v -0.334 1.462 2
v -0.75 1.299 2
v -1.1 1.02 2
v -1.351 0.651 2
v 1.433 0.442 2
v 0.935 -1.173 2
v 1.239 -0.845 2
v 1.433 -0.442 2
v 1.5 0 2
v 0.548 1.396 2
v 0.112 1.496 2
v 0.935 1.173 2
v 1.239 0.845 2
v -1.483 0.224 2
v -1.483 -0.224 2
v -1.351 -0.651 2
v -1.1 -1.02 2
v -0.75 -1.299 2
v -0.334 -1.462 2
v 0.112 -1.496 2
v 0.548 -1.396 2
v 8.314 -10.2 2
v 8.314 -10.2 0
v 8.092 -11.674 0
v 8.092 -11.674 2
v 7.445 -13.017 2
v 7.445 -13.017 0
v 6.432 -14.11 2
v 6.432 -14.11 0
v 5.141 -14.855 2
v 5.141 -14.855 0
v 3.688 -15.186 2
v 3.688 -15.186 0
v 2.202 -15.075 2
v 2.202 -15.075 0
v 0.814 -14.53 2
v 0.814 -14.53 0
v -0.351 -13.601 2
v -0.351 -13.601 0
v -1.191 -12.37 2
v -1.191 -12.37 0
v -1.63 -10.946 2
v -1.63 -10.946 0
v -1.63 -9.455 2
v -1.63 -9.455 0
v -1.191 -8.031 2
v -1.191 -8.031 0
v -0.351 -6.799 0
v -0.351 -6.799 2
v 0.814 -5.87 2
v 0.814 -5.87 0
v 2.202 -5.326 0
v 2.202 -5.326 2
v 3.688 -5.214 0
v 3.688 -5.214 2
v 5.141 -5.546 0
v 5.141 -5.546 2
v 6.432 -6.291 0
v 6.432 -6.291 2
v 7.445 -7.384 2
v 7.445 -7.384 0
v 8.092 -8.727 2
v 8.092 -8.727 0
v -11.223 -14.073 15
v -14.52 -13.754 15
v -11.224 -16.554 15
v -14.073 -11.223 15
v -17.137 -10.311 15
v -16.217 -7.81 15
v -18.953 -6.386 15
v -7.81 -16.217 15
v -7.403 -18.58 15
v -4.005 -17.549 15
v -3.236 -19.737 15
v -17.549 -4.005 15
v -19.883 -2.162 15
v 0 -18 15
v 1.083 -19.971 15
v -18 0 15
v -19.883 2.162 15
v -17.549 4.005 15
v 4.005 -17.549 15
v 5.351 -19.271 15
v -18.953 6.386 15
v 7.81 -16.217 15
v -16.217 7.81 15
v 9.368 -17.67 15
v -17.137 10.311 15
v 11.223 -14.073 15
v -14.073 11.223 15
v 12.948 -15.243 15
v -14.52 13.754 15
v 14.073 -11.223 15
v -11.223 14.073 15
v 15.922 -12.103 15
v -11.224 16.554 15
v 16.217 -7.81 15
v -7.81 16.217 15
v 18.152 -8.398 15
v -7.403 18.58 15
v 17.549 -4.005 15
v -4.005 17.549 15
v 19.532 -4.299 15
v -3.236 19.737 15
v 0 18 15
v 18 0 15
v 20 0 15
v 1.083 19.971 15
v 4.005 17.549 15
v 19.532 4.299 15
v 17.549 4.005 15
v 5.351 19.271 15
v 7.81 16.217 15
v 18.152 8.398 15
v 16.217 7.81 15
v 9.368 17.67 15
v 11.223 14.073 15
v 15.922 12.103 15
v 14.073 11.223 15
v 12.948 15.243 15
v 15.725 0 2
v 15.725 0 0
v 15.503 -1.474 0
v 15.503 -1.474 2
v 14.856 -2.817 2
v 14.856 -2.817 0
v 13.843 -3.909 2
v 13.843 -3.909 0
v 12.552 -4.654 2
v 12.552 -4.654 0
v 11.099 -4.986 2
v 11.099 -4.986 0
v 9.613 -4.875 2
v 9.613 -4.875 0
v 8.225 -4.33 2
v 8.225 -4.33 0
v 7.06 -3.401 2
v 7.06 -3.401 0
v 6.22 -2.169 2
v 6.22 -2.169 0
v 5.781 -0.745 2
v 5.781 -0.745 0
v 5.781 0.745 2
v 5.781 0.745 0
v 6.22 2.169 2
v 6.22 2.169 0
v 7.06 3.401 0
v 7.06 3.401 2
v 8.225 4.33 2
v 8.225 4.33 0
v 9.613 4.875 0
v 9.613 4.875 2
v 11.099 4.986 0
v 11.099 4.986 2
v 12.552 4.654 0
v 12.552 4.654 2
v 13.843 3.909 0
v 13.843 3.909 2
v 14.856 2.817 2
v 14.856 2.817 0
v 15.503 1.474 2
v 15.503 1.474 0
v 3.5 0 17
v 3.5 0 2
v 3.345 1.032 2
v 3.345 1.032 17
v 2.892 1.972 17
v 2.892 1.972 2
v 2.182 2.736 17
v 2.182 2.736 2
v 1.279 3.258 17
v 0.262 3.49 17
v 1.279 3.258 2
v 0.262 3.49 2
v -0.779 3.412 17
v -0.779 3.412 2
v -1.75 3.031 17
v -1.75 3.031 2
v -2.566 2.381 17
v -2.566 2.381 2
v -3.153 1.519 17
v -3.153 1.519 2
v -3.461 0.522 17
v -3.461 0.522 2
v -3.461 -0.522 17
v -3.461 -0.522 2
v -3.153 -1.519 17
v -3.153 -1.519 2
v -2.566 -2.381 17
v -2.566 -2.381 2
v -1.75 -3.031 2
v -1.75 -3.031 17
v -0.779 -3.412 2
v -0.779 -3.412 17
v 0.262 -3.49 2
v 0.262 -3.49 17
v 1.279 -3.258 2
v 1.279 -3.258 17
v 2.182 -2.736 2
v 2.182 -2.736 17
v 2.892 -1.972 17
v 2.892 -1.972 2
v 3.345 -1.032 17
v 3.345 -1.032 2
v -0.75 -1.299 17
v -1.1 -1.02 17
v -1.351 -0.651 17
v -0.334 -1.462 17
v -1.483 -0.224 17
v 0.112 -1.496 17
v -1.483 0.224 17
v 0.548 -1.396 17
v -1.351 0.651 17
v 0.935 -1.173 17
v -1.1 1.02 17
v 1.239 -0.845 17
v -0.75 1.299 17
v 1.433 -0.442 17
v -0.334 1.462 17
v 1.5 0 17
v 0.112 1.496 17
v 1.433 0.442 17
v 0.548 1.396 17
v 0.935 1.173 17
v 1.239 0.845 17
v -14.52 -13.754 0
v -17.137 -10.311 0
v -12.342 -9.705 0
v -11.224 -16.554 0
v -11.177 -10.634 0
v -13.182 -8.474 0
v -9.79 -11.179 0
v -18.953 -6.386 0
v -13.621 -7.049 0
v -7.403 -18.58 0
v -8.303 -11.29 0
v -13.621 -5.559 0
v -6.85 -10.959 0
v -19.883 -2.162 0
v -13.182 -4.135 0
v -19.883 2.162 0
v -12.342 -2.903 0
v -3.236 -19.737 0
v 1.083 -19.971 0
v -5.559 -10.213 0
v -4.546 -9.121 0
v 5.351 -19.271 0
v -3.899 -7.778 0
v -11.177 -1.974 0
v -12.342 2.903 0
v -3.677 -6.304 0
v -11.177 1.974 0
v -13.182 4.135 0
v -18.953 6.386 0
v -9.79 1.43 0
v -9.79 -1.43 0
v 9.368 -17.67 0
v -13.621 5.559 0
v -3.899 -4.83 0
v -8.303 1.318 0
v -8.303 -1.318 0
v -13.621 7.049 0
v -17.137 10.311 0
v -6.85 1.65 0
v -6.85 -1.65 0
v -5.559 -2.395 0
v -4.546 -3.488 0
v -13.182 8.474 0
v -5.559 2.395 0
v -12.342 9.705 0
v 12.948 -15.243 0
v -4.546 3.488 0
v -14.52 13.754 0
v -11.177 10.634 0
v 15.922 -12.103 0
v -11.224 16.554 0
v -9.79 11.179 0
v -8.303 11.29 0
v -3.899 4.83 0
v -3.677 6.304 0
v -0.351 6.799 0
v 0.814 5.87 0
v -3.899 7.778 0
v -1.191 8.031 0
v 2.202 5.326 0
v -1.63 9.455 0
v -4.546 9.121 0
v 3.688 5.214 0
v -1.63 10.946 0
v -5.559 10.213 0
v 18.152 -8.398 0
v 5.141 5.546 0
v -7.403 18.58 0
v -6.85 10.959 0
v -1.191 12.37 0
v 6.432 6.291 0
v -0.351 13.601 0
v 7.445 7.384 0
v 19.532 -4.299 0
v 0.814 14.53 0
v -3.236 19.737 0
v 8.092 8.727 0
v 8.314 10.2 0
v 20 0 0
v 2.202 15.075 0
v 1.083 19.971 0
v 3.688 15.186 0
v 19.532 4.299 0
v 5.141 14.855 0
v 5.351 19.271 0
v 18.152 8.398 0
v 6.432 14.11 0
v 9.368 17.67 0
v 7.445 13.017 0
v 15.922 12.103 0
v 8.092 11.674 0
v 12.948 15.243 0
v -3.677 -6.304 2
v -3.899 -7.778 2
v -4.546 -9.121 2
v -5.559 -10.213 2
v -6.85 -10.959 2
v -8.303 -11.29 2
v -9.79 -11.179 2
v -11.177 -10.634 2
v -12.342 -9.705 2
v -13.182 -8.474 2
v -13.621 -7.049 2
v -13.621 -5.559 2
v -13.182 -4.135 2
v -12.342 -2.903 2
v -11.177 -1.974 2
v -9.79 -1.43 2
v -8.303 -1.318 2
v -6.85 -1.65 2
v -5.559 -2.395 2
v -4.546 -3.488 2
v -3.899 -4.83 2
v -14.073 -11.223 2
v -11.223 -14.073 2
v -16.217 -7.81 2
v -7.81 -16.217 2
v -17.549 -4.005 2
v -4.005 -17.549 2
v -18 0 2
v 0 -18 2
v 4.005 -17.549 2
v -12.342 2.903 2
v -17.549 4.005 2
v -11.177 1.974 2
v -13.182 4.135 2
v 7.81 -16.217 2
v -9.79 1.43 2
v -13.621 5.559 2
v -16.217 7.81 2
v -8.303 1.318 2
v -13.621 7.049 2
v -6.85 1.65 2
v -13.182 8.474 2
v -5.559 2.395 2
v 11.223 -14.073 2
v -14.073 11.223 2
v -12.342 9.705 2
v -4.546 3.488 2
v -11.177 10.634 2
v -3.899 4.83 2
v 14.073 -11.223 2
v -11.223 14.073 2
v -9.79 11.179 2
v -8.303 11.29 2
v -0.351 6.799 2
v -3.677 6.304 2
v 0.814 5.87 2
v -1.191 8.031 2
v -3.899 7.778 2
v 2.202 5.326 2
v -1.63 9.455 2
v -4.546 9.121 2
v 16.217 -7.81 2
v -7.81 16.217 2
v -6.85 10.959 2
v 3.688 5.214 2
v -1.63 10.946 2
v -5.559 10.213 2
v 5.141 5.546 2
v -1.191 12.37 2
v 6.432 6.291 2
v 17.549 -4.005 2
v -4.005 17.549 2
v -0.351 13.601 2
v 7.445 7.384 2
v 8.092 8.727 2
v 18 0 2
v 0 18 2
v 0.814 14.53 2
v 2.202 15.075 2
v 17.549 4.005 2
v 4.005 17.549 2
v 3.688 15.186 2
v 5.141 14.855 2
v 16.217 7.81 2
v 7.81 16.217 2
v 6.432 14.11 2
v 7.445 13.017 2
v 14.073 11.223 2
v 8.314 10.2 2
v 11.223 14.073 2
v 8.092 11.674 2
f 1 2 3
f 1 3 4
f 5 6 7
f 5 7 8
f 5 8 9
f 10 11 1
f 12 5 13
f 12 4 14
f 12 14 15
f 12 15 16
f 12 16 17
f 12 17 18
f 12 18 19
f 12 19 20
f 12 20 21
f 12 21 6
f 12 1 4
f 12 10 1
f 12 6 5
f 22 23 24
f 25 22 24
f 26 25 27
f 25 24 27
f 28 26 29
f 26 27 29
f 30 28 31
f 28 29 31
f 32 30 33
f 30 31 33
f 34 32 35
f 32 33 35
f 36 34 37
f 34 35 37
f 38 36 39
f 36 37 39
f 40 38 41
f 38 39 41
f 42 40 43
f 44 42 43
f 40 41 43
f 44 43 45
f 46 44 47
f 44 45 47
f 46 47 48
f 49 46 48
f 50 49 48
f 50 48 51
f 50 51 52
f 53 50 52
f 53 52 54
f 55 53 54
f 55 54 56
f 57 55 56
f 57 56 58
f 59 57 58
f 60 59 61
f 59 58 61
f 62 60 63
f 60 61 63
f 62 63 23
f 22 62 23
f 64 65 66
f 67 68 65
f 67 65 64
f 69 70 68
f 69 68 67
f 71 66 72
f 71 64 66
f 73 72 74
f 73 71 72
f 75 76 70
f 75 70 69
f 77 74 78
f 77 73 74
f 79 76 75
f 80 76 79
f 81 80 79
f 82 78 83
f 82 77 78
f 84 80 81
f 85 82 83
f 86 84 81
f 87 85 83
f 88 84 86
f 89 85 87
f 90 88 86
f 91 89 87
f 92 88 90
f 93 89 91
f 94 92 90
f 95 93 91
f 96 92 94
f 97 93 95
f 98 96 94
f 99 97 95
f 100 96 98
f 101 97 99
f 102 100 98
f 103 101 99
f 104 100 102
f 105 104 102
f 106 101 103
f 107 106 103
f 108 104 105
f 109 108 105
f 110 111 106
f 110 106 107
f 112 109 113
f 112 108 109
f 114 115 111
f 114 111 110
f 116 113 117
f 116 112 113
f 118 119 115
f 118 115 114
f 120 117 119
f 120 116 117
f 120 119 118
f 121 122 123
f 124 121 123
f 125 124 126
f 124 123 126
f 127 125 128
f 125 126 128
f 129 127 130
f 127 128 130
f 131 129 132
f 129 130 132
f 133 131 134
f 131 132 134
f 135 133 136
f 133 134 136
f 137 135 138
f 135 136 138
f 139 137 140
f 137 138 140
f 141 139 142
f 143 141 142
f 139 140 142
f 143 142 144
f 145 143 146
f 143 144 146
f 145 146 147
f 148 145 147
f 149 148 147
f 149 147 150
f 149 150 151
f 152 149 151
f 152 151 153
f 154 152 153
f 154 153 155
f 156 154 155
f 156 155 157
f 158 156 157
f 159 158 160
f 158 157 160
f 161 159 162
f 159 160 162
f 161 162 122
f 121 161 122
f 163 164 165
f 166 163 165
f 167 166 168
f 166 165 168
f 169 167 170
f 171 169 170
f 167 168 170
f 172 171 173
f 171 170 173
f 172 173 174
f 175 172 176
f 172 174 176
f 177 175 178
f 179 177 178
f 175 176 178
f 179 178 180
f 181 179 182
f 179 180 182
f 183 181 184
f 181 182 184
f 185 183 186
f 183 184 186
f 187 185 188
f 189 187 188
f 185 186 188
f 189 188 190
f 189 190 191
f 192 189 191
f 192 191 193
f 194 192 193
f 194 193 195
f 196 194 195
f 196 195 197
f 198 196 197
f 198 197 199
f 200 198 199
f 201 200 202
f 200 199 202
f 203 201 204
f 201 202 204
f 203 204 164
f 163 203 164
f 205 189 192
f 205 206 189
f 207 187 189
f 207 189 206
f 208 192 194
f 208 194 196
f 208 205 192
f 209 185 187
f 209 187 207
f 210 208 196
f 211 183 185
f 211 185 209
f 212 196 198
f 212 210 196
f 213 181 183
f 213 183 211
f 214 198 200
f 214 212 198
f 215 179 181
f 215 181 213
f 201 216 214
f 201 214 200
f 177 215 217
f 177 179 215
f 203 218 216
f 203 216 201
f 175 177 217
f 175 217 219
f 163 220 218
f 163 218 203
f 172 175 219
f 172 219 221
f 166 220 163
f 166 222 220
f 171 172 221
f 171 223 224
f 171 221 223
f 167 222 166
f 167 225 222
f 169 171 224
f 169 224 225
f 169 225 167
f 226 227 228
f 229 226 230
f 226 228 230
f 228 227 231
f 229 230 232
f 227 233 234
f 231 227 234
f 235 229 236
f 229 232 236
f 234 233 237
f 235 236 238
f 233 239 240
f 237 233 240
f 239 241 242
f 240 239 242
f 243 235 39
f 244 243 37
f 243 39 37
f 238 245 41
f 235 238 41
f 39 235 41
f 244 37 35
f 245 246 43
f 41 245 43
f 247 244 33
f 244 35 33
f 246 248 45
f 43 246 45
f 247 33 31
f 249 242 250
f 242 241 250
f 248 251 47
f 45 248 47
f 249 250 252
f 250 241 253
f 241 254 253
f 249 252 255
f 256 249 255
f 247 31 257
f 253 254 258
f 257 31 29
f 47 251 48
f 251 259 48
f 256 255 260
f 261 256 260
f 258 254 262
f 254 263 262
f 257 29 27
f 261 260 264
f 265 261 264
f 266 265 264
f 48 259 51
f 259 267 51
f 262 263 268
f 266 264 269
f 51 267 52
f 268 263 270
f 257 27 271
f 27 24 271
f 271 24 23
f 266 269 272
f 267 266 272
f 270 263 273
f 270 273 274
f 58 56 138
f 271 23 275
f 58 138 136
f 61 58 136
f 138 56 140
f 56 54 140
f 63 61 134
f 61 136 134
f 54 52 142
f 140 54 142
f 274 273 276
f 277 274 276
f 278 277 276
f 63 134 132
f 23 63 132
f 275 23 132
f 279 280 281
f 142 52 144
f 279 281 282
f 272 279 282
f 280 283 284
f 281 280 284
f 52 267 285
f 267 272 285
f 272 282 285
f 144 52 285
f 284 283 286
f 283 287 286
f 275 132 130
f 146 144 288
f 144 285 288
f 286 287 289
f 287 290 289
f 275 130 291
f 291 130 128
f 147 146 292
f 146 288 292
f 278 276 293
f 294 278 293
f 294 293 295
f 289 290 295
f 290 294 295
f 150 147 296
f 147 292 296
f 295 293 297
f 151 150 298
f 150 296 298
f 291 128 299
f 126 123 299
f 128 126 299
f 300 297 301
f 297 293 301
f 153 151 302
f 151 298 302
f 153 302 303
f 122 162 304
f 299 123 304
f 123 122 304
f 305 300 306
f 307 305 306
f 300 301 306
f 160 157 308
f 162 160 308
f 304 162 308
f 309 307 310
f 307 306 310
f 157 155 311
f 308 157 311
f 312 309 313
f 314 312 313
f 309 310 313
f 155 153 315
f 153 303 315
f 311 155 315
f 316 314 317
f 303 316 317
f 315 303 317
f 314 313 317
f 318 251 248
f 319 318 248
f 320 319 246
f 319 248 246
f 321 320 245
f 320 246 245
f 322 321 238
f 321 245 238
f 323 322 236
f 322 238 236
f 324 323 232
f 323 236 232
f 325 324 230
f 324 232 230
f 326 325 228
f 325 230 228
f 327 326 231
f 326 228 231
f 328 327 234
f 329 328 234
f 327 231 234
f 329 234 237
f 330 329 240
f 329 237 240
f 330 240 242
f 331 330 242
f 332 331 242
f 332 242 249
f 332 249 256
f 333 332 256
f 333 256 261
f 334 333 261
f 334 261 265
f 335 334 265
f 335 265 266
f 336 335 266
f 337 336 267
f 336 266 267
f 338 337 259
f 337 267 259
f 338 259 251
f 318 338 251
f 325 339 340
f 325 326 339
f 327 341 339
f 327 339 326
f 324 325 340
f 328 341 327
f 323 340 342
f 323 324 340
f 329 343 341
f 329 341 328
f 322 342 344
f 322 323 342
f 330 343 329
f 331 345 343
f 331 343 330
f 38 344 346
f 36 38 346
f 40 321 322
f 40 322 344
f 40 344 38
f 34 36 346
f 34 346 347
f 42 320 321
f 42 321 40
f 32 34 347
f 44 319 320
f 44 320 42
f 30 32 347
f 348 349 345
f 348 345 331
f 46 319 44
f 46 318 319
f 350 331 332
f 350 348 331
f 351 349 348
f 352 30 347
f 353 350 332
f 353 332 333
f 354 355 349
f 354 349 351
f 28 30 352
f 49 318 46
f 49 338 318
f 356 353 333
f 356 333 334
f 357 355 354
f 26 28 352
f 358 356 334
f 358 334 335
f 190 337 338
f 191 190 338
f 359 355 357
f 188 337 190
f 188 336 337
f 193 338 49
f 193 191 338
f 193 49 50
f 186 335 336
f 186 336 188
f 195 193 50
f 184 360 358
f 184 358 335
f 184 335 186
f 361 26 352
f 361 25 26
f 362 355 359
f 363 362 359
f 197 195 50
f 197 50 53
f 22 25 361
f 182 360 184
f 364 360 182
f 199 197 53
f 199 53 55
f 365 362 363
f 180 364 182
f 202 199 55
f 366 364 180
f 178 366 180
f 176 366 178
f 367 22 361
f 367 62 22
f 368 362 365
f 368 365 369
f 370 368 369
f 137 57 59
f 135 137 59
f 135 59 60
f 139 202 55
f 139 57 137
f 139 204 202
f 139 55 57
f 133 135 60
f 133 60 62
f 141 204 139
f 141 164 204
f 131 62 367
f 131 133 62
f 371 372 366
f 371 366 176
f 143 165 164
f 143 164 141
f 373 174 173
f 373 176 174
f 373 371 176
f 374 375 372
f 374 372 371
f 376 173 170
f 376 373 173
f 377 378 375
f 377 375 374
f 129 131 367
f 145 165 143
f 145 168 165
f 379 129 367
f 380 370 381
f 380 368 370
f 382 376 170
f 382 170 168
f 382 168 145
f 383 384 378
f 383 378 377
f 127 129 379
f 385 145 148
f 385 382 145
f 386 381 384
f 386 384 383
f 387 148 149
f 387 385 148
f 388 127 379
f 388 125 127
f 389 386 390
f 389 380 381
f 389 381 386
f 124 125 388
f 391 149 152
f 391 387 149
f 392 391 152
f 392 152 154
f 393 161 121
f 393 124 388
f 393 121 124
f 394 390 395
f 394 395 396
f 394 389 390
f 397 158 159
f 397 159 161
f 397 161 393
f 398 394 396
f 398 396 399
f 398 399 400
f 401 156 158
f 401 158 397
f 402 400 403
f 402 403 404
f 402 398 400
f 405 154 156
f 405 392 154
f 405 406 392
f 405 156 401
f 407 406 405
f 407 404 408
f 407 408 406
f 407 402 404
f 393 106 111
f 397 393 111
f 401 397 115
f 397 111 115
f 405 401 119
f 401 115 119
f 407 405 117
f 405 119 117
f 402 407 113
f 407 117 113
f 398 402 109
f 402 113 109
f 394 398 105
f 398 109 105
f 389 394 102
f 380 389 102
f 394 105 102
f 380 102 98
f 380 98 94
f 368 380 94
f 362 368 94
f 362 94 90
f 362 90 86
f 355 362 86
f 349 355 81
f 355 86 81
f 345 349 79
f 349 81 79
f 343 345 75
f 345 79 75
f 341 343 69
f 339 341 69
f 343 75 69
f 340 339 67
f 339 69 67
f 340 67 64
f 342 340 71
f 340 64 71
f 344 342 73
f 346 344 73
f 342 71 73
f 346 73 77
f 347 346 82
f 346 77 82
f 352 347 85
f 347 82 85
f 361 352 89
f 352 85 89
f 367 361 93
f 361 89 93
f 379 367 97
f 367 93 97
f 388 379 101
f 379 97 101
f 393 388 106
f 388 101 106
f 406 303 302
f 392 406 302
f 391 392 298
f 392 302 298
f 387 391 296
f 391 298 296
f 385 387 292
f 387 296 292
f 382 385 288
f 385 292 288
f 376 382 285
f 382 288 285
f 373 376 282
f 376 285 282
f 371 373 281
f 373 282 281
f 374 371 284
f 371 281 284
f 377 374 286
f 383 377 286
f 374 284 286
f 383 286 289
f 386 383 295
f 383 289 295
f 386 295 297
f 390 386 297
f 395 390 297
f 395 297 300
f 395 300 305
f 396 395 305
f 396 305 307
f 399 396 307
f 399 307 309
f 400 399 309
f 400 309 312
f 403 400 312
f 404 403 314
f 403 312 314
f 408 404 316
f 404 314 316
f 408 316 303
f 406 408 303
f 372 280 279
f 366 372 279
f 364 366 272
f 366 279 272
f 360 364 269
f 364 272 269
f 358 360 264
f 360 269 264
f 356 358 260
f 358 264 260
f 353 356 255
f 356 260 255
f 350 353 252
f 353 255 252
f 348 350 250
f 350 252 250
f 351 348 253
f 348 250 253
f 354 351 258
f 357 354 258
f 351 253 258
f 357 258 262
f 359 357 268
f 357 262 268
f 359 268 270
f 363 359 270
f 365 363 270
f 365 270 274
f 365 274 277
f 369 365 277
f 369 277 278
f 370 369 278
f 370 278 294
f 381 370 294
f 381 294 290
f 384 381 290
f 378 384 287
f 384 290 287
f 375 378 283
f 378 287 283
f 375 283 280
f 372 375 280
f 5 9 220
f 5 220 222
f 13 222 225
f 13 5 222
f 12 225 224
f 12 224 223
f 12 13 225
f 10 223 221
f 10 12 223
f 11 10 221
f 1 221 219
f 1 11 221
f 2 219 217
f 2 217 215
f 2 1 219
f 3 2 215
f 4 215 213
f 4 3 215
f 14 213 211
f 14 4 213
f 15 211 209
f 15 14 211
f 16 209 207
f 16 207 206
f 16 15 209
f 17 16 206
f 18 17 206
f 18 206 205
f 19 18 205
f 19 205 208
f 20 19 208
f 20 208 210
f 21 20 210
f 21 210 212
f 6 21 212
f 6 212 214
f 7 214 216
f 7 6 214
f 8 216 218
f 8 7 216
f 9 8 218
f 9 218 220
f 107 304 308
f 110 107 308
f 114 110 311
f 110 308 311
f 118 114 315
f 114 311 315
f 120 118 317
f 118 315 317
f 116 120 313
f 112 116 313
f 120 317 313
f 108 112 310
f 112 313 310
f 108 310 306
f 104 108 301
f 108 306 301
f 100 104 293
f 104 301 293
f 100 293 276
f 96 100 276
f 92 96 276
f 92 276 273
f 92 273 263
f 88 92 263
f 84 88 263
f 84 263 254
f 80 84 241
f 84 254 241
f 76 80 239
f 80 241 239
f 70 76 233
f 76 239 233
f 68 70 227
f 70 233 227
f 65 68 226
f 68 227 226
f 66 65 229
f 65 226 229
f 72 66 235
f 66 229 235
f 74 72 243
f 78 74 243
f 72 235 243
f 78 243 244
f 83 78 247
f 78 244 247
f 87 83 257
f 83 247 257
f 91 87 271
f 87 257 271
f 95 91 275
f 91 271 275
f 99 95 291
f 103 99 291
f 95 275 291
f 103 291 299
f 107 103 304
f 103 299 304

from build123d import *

# Parameters (mm, degrees)
F0_R     = 20
F1_DEPTH = 15
F2_R     = 18
F3_DEPTH = 13
F4_R     = 3.5
F4_R_2   = 1.5
F5_DEPTH = 15
F6_R     = 5
F7_DEPTH = 2


with BuildPart() as f1:
    # F0 (on Top) → F1 (new body)
    with BuildSketch(Plane.XY):
        Circle(F0_R)
    extrude(amount=F1_DEPTH)

    # F2 (on face) → F3 (cut)
    with BuildSketch(Plane.XY.offset(15)):
        Circle(F2_R)
    extrude(amount=-F3_DEPTH, mode=Mode.SUBTRACT)

    # F4 (on face) → F5 (join)
    with BuildSketch(Plane.XY.offset(2)):
        Circle(F4_R)
        Circle(F4_R_2, mode=Mode.SUBTRACT)
    extrude(amount=F5_DEPTH)

    # F6 (on face) → F7 (cut)
    with BuildSketch(Plane(origin=(0, 0, 0), x_dir=(1, 0, 0), z_dir=(0, 0, -1))):
        with Locations((10.725294, 0)):
            Circle(F6_R)
        with Locations((3.314298, -10.200361)):
            Circle(F6_R)
        with Locations((-8.676945, -6.30417)):
            Circle(F6_R)
        with Locations((-8.676945, 6.30417)):
            Circle(F6_R)
        with Locations((3.314298, 10.200361)):
            Circle(F6_R)
    extrude(amount=-F7_DEPTH, mode=Mode.SUBTRACT)


solid = f1.part
